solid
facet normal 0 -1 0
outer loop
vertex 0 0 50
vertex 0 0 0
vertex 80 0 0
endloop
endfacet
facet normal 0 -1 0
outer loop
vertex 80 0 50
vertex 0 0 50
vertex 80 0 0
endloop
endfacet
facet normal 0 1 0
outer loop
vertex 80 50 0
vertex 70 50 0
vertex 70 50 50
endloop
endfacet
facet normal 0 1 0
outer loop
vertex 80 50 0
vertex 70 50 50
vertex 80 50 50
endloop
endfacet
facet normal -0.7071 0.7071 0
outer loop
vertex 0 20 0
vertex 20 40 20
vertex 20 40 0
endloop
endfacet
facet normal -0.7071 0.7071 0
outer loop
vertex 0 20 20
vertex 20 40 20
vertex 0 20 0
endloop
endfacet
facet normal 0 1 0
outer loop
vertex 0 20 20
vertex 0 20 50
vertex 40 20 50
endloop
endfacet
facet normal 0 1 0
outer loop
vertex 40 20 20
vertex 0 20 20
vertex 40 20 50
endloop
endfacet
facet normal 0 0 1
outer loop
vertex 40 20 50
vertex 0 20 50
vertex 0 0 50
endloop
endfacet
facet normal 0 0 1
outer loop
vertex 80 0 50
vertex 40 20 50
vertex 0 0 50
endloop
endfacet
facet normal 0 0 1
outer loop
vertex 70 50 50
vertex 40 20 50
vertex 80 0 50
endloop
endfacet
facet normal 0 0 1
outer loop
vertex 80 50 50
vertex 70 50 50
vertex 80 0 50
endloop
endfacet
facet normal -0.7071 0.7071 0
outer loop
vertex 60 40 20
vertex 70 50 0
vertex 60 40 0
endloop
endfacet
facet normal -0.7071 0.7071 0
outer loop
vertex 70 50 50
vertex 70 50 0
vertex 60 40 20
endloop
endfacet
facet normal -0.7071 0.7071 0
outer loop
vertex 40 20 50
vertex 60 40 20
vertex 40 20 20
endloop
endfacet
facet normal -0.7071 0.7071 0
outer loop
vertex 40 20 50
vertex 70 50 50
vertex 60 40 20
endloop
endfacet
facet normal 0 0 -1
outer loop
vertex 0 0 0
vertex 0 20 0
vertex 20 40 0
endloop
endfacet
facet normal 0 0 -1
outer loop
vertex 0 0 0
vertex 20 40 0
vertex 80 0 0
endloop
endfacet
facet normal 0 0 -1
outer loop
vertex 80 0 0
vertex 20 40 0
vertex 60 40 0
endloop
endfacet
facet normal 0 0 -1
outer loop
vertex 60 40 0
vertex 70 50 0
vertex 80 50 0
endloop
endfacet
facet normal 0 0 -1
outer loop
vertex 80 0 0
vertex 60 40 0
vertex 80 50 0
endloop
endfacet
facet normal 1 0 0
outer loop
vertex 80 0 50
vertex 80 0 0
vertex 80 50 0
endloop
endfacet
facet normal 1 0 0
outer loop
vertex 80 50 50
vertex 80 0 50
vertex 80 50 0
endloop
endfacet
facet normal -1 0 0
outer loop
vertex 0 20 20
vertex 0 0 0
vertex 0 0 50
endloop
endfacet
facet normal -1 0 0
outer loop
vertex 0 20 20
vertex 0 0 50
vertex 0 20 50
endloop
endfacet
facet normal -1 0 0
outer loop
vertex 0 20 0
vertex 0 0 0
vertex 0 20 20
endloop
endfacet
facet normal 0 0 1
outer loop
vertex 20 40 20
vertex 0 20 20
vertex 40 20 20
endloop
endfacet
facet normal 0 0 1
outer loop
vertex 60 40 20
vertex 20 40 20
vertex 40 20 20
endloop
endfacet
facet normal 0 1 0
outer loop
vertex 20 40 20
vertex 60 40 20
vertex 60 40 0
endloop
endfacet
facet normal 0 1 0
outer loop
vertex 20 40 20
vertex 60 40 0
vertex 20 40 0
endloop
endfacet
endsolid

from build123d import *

# Parameters (mm, degrees)
SKETCH1_W           = 80
SKETCH1_H           = 50
BOSS_EXTRUDE1_DEPTH = 50
CUT_EXTRUDE1_DEPTH  = 50
CUT_EXTRUDE2_DEPTH  = 30


with BuildPart() as part:
    # Sketch1 → Boss-Extrude1 (new body)
    with BuildSketch(Plane.XY):
        with Locations((40, 25)):
            Rectangle(SKETCH1_W, SKETCH1_H)
    extrude(amount=BOSS_EXTRUDE1_DEPTH)

    # Sketch2 → Cut-Extrude1 (cut)
    with BuildSketch(Plane.XY.offset(50)):
        Polygon((70, 50), (60, 40), (20, 40), (0, 20), (0, 50), align=None)
    extrude(amount=-CUT_EXTRUDE1_DEPTH, mode=Mode.SUBTRACT)

    # Sketch3 → Cut-Extrude2 (cut)
    with BuildSketch(Plane.XY.offset(50)):
        Polygon((0, 20), (40, 20), (60, 40), (20, 40), align=None)
    extrude(amount=-CUT_EXTRUDE2_DEPTH, mode=Mode.SUBTRACT)


solid = part.part
